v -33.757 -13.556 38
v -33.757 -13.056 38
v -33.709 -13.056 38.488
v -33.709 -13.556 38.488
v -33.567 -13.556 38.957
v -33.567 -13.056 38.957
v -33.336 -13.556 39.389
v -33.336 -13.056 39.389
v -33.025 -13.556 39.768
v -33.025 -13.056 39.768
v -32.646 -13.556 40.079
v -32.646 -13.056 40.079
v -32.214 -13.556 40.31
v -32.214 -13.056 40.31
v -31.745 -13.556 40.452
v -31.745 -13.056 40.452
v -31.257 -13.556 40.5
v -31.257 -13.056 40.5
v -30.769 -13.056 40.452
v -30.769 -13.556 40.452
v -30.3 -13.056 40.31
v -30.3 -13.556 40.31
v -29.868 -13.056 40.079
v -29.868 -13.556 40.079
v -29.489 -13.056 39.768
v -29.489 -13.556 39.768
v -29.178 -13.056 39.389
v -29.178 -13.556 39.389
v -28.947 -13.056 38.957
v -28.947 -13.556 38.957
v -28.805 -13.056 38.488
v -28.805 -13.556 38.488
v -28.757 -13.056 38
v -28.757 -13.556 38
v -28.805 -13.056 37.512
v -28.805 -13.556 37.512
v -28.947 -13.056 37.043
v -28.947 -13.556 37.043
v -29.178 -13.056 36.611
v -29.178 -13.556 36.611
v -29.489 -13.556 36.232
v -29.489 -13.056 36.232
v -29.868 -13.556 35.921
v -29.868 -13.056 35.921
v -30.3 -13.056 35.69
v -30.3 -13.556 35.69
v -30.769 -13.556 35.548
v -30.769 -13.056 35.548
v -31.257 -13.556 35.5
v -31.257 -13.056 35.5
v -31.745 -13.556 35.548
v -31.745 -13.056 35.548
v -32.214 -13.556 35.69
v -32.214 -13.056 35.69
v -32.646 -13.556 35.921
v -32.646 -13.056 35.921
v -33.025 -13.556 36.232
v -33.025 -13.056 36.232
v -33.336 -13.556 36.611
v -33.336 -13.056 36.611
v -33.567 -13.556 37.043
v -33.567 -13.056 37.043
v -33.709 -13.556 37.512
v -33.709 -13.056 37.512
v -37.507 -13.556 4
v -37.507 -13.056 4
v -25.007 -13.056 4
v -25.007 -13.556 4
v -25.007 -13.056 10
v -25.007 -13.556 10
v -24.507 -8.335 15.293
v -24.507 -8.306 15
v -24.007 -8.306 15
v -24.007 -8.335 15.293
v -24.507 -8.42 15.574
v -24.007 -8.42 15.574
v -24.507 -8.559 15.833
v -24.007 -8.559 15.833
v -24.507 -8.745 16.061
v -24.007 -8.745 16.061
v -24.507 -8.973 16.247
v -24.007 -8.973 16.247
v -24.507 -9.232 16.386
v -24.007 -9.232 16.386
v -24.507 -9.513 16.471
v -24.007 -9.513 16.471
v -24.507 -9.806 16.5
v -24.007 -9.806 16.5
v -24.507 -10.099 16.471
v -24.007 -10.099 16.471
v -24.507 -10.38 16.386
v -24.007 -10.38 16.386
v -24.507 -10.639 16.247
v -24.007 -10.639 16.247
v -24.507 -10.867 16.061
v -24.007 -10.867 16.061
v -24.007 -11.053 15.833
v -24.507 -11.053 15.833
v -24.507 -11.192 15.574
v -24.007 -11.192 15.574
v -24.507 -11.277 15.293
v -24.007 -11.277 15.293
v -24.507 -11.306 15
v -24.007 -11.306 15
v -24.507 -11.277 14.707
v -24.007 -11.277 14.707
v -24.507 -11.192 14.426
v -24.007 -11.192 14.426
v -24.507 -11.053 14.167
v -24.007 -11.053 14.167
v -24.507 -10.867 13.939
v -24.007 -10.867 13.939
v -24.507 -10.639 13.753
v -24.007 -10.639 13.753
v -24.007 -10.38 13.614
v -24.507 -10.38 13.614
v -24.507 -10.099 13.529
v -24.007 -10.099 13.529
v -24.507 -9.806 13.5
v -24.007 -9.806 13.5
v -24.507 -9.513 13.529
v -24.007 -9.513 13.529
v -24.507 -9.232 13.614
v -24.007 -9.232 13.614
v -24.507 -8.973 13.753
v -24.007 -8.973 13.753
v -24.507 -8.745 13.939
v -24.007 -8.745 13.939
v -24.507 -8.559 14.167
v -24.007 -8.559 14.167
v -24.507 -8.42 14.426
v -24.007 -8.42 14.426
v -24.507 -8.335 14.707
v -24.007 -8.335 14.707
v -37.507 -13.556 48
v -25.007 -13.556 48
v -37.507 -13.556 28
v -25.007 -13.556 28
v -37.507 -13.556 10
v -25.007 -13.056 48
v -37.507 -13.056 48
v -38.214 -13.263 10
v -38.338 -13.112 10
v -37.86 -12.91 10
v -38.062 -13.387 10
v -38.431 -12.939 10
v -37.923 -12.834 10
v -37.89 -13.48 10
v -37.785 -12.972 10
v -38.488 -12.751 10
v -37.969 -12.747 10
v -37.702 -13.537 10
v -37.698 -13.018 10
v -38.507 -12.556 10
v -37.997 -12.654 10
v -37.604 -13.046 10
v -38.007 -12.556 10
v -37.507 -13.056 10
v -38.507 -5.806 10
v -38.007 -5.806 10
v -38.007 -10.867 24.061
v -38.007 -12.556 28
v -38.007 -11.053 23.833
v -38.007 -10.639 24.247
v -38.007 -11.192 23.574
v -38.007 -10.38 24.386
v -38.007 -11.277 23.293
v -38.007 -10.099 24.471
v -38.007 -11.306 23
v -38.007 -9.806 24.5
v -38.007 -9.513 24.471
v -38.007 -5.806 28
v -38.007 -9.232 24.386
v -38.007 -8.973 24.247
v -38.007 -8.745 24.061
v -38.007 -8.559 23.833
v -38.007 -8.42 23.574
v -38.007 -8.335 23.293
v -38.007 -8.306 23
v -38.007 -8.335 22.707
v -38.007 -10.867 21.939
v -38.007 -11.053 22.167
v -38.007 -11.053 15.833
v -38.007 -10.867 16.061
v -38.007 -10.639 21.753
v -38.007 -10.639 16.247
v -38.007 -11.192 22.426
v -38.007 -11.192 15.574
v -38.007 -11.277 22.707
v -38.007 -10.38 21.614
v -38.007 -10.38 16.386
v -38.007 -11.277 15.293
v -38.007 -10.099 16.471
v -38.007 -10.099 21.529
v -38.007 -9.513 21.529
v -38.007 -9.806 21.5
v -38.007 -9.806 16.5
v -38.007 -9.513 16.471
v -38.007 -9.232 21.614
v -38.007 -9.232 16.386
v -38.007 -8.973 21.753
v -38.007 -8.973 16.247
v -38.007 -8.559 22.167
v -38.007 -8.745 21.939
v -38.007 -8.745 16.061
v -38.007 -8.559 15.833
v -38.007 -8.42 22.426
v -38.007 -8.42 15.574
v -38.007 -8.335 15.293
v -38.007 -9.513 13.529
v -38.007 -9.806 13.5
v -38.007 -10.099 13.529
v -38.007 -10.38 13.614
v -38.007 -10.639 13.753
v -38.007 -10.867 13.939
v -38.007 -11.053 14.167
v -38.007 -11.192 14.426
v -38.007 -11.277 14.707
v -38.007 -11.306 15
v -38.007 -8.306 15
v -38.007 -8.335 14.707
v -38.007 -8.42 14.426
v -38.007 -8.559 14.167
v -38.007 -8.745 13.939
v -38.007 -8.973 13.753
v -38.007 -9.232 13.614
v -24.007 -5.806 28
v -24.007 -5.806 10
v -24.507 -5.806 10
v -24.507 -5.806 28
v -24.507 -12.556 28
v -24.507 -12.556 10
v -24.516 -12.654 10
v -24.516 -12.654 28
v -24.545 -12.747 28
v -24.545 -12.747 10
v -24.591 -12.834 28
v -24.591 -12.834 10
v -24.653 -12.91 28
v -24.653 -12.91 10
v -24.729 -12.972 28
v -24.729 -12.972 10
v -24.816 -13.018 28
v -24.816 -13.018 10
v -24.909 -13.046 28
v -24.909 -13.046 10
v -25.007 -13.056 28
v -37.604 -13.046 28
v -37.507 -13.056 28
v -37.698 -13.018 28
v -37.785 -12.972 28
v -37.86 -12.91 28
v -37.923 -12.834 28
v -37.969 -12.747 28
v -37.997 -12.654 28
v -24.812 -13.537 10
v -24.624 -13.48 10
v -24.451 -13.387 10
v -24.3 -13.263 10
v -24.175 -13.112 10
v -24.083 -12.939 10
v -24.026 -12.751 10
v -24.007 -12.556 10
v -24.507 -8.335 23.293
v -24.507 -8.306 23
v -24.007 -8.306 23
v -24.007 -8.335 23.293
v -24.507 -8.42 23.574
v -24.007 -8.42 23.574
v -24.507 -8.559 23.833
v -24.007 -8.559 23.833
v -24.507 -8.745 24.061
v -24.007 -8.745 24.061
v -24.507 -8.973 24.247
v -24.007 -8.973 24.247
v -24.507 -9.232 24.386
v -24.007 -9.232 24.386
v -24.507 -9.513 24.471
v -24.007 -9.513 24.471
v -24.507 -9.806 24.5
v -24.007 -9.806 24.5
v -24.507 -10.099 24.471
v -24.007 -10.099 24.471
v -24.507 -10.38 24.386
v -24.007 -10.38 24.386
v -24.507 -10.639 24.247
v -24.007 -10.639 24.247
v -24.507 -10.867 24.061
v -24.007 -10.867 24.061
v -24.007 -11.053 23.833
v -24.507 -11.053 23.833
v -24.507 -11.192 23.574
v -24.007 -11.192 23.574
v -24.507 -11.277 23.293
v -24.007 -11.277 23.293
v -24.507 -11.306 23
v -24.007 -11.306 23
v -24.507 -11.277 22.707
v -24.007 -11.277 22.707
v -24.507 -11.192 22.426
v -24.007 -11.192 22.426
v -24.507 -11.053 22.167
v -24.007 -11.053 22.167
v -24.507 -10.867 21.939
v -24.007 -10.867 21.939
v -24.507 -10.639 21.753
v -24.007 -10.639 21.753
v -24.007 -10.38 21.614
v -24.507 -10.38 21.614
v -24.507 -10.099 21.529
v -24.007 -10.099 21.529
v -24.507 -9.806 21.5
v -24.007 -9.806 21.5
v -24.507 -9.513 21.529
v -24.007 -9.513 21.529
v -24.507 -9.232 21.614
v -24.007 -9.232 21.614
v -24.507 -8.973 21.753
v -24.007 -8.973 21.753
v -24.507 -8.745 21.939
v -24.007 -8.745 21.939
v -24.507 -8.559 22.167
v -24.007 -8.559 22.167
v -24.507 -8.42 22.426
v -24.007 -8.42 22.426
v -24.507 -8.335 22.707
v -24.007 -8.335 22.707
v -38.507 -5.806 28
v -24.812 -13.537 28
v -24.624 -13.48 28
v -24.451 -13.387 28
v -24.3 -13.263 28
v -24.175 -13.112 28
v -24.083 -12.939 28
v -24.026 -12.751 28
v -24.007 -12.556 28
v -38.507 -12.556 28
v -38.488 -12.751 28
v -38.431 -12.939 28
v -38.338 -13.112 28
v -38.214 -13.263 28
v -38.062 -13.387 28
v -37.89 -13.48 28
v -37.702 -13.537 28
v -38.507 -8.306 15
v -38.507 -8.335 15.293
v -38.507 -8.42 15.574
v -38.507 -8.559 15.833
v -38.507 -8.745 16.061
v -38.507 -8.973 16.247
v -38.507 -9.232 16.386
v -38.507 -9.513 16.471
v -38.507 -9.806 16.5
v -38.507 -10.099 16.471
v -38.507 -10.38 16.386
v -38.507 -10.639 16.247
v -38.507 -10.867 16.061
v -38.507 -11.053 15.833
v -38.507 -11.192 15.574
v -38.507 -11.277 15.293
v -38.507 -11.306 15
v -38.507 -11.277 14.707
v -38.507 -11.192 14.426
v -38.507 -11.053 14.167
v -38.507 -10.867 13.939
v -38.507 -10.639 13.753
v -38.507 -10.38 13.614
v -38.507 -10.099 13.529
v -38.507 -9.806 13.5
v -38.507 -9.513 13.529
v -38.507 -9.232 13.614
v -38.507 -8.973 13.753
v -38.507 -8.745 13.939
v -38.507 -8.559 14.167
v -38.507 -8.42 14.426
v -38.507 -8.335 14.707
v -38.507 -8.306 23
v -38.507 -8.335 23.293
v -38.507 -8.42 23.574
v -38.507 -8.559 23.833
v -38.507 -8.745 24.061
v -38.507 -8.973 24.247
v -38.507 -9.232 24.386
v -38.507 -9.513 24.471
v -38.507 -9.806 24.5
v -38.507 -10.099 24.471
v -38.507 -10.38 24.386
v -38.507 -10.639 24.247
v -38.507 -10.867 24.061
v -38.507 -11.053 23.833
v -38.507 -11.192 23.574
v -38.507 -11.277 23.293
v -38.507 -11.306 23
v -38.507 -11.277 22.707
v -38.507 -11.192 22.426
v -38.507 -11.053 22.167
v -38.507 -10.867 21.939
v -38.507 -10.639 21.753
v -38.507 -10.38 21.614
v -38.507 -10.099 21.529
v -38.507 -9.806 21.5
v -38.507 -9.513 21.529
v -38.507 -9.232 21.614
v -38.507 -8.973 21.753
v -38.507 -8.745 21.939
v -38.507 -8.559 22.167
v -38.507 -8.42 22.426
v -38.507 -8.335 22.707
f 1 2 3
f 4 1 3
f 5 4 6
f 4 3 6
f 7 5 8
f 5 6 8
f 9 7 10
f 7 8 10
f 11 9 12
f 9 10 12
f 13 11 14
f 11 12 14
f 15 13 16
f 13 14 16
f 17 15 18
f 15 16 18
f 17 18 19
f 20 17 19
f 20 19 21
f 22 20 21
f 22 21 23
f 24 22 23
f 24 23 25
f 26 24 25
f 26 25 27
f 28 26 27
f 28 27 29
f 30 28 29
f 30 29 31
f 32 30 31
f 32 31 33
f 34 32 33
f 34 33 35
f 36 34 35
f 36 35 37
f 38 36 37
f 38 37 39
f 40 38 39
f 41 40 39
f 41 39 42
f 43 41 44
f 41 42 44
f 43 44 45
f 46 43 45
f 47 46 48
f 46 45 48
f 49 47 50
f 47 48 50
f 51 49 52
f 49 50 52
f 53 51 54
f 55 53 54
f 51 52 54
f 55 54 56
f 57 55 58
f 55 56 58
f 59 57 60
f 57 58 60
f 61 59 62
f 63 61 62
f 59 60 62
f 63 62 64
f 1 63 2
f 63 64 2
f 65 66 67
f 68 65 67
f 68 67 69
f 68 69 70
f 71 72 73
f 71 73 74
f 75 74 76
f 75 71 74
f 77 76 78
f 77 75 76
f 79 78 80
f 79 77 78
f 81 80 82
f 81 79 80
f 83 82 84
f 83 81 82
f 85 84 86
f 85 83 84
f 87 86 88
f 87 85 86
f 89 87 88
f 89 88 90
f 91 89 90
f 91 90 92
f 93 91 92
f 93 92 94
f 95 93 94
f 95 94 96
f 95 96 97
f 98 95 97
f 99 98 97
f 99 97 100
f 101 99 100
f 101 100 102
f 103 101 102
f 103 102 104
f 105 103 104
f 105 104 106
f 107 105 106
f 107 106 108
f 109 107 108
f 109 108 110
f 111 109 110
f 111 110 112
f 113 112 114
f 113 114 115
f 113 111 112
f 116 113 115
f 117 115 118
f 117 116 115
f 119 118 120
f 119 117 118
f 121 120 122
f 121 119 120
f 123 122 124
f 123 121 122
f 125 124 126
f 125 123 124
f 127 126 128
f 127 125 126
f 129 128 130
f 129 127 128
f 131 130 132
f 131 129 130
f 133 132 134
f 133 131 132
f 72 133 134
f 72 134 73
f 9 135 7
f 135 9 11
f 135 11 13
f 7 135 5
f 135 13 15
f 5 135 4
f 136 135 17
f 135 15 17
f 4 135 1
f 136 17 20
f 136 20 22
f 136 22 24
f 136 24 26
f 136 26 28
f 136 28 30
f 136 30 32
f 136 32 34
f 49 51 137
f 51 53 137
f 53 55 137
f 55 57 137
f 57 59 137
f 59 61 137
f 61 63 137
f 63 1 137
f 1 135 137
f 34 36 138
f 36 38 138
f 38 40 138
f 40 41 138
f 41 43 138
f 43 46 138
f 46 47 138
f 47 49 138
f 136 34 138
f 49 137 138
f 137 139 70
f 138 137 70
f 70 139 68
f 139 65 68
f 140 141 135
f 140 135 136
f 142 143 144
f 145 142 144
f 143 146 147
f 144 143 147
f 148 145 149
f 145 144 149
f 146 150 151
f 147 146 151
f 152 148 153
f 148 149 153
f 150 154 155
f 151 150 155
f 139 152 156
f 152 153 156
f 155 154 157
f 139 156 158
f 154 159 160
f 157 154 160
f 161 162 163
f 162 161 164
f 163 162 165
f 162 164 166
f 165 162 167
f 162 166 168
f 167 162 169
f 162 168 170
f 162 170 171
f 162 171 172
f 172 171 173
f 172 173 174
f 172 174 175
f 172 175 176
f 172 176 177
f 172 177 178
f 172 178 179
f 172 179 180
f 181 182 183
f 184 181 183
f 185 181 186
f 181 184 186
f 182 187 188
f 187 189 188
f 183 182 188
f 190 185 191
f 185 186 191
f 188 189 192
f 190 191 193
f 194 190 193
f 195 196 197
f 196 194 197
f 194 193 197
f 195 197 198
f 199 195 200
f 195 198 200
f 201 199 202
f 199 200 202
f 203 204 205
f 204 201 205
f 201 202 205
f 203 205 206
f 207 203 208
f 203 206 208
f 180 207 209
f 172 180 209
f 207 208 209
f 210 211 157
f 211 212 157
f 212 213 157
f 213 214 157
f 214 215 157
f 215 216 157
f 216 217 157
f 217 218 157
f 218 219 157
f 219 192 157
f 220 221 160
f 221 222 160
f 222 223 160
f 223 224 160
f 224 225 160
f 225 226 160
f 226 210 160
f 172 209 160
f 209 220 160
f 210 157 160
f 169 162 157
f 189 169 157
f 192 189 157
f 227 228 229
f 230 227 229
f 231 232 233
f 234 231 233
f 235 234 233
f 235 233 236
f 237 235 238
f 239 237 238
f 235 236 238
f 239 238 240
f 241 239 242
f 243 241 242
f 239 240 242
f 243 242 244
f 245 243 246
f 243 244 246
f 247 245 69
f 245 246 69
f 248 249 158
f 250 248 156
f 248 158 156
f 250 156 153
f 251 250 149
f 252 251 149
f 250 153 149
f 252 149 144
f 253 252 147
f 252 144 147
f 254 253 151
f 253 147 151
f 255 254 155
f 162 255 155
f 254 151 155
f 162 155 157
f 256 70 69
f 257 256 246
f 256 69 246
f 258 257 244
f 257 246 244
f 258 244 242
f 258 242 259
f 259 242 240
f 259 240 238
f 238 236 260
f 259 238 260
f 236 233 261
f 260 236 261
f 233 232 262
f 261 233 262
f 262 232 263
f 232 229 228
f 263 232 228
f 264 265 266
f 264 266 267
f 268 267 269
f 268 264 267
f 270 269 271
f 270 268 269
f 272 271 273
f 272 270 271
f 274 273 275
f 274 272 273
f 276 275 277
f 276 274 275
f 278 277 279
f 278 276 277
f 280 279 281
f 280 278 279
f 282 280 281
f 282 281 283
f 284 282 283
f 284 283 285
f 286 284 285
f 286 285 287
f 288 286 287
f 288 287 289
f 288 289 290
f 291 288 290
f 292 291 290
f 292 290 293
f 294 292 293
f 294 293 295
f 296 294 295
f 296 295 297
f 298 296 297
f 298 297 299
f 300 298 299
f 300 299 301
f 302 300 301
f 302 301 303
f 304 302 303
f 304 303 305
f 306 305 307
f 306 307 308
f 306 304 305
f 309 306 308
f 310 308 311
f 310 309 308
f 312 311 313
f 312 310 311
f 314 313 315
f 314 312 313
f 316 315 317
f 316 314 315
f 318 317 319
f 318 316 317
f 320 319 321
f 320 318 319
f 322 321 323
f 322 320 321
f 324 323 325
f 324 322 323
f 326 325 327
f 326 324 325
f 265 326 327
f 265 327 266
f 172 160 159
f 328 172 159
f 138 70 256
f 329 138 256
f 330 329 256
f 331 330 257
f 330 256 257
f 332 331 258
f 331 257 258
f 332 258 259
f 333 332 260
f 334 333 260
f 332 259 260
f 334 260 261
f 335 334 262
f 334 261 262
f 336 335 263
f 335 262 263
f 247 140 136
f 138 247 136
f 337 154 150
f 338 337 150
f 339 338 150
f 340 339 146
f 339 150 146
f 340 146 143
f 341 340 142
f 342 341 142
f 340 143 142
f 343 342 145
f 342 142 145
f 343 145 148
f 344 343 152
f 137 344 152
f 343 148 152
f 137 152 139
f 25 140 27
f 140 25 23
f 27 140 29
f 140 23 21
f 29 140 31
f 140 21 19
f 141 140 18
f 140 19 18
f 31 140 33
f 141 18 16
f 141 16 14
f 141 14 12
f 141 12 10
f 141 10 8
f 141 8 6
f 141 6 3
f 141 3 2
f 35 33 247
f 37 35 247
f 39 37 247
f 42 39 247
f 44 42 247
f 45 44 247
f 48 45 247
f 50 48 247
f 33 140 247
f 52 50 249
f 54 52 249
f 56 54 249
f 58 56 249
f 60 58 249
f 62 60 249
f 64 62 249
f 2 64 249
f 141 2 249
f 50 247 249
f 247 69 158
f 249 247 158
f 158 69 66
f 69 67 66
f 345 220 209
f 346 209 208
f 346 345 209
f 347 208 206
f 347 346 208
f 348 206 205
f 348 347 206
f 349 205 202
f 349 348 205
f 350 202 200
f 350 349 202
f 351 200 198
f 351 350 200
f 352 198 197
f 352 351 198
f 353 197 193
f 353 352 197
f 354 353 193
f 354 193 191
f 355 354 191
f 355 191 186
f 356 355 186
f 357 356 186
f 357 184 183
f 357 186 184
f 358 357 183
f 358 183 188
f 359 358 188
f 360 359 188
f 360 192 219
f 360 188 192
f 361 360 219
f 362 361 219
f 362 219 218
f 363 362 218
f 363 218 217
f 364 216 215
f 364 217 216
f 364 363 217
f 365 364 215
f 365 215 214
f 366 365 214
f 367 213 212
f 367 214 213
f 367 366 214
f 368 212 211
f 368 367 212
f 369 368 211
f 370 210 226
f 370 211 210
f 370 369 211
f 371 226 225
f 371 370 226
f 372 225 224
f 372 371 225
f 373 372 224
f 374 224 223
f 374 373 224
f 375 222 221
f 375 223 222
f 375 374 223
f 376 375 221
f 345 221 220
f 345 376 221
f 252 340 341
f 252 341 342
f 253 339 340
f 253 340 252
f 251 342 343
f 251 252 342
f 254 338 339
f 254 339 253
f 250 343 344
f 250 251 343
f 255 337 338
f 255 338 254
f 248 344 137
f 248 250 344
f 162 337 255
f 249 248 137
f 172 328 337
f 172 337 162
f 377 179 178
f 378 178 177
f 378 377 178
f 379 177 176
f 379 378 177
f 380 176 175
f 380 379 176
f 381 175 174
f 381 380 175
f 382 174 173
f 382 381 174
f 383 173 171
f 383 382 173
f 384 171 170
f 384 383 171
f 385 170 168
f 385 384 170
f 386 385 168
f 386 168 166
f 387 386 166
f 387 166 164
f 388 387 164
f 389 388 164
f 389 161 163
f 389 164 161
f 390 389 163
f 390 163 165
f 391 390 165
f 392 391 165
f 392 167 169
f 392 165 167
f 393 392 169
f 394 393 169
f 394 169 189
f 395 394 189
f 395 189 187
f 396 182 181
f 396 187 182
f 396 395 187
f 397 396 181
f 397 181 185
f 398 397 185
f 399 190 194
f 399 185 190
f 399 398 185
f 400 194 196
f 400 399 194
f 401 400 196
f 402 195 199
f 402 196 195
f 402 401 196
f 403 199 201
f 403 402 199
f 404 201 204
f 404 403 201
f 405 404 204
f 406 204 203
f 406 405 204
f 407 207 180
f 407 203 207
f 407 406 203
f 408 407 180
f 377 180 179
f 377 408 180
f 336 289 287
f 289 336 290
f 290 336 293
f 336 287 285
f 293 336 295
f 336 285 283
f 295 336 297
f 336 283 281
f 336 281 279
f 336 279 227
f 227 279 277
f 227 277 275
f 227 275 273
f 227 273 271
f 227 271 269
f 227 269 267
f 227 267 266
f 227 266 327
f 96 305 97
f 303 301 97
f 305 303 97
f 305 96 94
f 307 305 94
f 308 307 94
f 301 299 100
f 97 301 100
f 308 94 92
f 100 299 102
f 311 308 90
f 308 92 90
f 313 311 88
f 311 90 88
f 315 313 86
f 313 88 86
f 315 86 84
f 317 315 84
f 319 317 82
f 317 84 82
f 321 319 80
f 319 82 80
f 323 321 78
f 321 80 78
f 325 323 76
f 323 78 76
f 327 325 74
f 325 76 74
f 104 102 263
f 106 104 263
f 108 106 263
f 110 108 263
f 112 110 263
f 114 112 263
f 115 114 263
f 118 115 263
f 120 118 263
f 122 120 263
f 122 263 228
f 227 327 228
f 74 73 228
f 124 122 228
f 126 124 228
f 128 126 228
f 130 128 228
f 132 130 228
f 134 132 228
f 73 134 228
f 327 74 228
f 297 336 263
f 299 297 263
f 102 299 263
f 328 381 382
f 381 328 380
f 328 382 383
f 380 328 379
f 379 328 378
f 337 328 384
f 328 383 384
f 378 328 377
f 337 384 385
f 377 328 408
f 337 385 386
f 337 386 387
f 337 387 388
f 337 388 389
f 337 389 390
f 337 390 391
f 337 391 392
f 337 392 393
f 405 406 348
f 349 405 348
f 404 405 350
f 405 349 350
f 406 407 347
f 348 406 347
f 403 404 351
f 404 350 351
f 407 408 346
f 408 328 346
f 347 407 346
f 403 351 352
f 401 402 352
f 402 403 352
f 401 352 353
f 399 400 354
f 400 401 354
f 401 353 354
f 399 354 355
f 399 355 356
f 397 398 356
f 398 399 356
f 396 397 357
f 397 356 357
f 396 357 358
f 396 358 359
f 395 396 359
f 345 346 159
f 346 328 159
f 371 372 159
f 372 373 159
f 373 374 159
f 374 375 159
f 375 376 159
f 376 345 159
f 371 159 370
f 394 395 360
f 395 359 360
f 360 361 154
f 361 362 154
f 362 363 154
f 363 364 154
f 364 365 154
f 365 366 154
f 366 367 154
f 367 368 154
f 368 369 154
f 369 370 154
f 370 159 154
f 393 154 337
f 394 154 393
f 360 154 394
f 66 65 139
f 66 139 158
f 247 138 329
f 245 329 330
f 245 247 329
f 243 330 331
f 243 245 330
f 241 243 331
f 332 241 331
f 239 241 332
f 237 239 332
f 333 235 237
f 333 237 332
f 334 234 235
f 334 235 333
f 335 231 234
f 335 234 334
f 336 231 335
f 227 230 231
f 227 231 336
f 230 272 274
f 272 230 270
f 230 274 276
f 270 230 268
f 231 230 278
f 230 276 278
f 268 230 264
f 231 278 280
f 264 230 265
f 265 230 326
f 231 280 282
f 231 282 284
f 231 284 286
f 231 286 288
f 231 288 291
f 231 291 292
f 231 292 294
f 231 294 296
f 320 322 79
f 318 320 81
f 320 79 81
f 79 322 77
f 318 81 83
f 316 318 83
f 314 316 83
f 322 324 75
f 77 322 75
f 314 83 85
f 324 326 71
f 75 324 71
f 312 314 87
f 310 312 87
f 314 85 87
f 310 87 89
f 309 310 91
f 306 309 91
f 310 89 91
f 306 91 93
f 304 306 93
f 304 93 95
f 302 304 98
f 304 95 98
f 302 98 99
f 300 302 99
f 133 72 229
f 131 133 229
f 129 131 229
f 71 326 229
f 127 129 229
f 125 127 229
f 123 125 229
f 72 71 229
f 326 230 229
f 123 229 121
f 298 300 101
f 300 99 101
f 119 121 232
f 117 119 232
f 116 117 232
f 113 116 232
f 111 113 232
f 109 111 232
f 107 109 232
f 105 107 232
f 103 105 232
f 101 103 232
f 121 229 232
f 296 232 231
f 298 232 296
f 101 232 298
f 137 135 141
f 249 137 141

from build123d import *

# Parameters (mm, degrees)
BRIDA_BASE1_DEPTH           = 48
CROQUIS5_R                  = 2.5
CORTAR_EXTRUIR1_DEPTH       = 10
CORTAR_EXTRUIR2_START       = 28
CORTAR_EXTRUIR2_DEPTH       = 20
CORTAR_EXTRUIR2_2_DEPTH     = 10
CORTAR_EXTRUIR2_START_2     = -38.506869712
CORTAR_EXTRUIR2_3_OUTLINE_R = 1.5
CORTAR_EXTRUIR2_3_DEPTH     = 14.5
CROQUIS7_W                  = 12.5
CROQUIS7_H                  = 4
CORTAR_EXTRUIR4_DEPTH       = 10


with BuildPart() as part:
    # Brida base1: sheet metal written as solids
    # Croquis1 → Brida base1 (new body)
    with BuildSketch(Plane.XY):
        with BuildLine():
            Line((-38.506869712, -5.805989848), (-38.506869712, -12.555989848))
            ThreePointArc((-38.506869712, -12.555989848), (-38.213976494, -13.263096629), (-37.506869712, -13.555989848))
            Line((-37.506869712, -13.555989848), (-25.006869712, -13.555989848))
            ThreePointArc((-25.006869712, -13.555989848), (-24.299762931, -13.263096629), (-24.006869712, -12.555989848))
            Line((-24.006869712, -12.555989848), (-24.006869712, -5.805989848))
            Line((-24.006869712, -5.805989848), (-24.506869712, -5.805989848))
            Line((-24.506869712, -5.805989848), (-24.506869712, -12.555989848))
            ThreePointArc((-24.506869712, -12.555989848), (-24.653316322, -12.909543238), (-25.006869712, -13.055989848))
            Line((-25.006869712, -13.055989848), (-37.506869712, -13.055989848))
            ThreePointArc((-37.506869712, -13.055989848), (-37.860423103, -12.909543238), (-38.006869712, -12.555989848))
            Line((-38.006869712, -12.555989848), (-38.006869712, -5.805989848))
            Line((-38.006869712, -5.805989848), (-38.506869712, -5.805989848))
        make_face()
    extrude(amount=BRIDA_BASE1_DEPTH)

    # Croquis5 → Cortar-Extruir1 (cut)
    with BuildSketch(Plane(origin=(0, -13.055989848, 0), x_dir=(1, 0, 0), z_dir=(0, 1, 0))):
        with Locations(Location((-31.256869712, -38, 0), (0, 0, 180))):
            Circle(CROQUIS5_R)
    extrude(amount=-CORTAR_EXTRUIR1_DEPTH, mode=Mode.SUBTRACT)

    # Cortar-Extruir2: read off the stored shape, not the designer's step
    # Cortar-Extruir2 outline → Cortar-Extruir2 (cut)
    with BuildSketch(Plane.XY.offset(CORTAR_EXTRUIR2_START)):
        with BuildLine():
            Line((-37.506869712, -13.555989848), (-37.506869712, -13.055989848))
            ThreePointArc((-37.506869712, -13.055989848), (-37.860423103, -12.909543239), (-38.006869712, -12.555989848))
            Line((-38.006869712, -12.555989848), (-38.006869712, -5.805989848))
            Line((-38.006869712, -5.805989848), (-38.506869712, -5.805989848))
            Line((-38.506869712, -5.805989848), (-38.506869712, -12.555989848))
            ThreePointArc((-38.506869712, -12.555989848), (-38.213976493, -13.26309663), (-37.506869712, -13.555989848))
        make_face()
        with BuildLine():
            ThreePointArc((-24.506869712, -12.555989848), (-24.653316322, -12.909543238), (-25.006869712, -13.055989848))
            Line((-25.006869712, -13.055989848), (-25.006869712, -13.555989848))
            ThreePointArc((-25.006869712, -13.555989848), (-24.299762931, -13.263096629), (-24.006869712, -12.555989848))
            Line((-24.006869712, -12.555989848), (-24.006869712, -5.805989848))
            Line((-24.006869712, -5.805989848), (-24.506869712, -5.805989848))
            Line((-24.506869712, -5.805989848), (-24.506869712, -12.555989848))
        make_face()
    extrude(amount=CORTAR_EXTRUIR2_DEPTH, mode=Mode.SUBTRACT)

    # Cortar-Extruir2 2 outline → Cortar-Extruir2 2 (cut)
    with BuildSketch(Plane.XY):
        with BuildLine():
            Line((-37.506869712, -13.555989848), (-37.506869712, -13.055989848))
            ThreePointArc((-37.506869712, -13.055989848), (-37.860423103, -12.909543239), (-38.006869712, -12.555989848))
            Line((-38.006869712, -12.555989848), (-38.006869712, -5.805989848))
            Line((-38.006869712, -5.805989848), (-38.506869712, -5.805989848))
            Line((-38.506869712, -5.805989848), (-38.506869712, -12.555989848))
            ThreePointArc((-38.506869712, -12.555989848), (-38.213976493, -13.26309663), (-37.506869712, -13.555989848))
        make_face()
        with BuildLine():
            ThreePointArc((-24.506869712, -12.555989848), (-24.653316322, -12.909543238), (-25.006869712, -13.055989848))
            Line((-25.006869712, -13.055989848), (-25.006869712, -13.555989848))
            ThreePointArc((-25.006869712, -13.555989848), (-24.299762931, -13.263096629), (-24.006869712, -12.555989848))
            Line((-24.006869712, -12.555989848), (-24.006869712, -5.805989848))
            Line((-24.006869712, -5.805989848), (-24.506869712, -5.805989848))
            Line((-24.506869712, -5.805989848), (-24.506869712, -12.555989848))
        make_face()
    extrude(amount=CORTAR_EXTRUIR2_2_DEPTH, mode=Mode.SUBTRACT)

    # Cortar-Extruir2 3 outline → Cortar-Extruir2 3 (cut)
    with BuildSketch(Plane.YZ.offset(CORTAR_EXTRUIR2_START_2)):
        with Locations((-9.805989848, 23)):
            Circle(CORTAR_EXTRUIR2_3_OUTLINE_R)
        with Locations((-9.805989848, 15)):
            Circle(CORTAR_EXTRUIR2_3_OUTLINE_R)
    extrude(amount=CORTAR_EXTRUIR2_3_DEPTH, mode=Mode.SUBTRACT)

    # Croquis7 → Cortar-Extruir4 (cut)
    with BuildSketch(Plane(origin=(0, -13.055989848, 0), x_dir=(1, 0, 0), z_dir=(0, 1, 0))):
        with Locations((-31.256869712, -2)):
            Rectangle(CROQUIS7_W, CROQUIS7_H)
    extrude(amount=-CORTAR_EXTRUIR4_DEPTH, mode=Mode.SUBTRACT)


solid = part.part
